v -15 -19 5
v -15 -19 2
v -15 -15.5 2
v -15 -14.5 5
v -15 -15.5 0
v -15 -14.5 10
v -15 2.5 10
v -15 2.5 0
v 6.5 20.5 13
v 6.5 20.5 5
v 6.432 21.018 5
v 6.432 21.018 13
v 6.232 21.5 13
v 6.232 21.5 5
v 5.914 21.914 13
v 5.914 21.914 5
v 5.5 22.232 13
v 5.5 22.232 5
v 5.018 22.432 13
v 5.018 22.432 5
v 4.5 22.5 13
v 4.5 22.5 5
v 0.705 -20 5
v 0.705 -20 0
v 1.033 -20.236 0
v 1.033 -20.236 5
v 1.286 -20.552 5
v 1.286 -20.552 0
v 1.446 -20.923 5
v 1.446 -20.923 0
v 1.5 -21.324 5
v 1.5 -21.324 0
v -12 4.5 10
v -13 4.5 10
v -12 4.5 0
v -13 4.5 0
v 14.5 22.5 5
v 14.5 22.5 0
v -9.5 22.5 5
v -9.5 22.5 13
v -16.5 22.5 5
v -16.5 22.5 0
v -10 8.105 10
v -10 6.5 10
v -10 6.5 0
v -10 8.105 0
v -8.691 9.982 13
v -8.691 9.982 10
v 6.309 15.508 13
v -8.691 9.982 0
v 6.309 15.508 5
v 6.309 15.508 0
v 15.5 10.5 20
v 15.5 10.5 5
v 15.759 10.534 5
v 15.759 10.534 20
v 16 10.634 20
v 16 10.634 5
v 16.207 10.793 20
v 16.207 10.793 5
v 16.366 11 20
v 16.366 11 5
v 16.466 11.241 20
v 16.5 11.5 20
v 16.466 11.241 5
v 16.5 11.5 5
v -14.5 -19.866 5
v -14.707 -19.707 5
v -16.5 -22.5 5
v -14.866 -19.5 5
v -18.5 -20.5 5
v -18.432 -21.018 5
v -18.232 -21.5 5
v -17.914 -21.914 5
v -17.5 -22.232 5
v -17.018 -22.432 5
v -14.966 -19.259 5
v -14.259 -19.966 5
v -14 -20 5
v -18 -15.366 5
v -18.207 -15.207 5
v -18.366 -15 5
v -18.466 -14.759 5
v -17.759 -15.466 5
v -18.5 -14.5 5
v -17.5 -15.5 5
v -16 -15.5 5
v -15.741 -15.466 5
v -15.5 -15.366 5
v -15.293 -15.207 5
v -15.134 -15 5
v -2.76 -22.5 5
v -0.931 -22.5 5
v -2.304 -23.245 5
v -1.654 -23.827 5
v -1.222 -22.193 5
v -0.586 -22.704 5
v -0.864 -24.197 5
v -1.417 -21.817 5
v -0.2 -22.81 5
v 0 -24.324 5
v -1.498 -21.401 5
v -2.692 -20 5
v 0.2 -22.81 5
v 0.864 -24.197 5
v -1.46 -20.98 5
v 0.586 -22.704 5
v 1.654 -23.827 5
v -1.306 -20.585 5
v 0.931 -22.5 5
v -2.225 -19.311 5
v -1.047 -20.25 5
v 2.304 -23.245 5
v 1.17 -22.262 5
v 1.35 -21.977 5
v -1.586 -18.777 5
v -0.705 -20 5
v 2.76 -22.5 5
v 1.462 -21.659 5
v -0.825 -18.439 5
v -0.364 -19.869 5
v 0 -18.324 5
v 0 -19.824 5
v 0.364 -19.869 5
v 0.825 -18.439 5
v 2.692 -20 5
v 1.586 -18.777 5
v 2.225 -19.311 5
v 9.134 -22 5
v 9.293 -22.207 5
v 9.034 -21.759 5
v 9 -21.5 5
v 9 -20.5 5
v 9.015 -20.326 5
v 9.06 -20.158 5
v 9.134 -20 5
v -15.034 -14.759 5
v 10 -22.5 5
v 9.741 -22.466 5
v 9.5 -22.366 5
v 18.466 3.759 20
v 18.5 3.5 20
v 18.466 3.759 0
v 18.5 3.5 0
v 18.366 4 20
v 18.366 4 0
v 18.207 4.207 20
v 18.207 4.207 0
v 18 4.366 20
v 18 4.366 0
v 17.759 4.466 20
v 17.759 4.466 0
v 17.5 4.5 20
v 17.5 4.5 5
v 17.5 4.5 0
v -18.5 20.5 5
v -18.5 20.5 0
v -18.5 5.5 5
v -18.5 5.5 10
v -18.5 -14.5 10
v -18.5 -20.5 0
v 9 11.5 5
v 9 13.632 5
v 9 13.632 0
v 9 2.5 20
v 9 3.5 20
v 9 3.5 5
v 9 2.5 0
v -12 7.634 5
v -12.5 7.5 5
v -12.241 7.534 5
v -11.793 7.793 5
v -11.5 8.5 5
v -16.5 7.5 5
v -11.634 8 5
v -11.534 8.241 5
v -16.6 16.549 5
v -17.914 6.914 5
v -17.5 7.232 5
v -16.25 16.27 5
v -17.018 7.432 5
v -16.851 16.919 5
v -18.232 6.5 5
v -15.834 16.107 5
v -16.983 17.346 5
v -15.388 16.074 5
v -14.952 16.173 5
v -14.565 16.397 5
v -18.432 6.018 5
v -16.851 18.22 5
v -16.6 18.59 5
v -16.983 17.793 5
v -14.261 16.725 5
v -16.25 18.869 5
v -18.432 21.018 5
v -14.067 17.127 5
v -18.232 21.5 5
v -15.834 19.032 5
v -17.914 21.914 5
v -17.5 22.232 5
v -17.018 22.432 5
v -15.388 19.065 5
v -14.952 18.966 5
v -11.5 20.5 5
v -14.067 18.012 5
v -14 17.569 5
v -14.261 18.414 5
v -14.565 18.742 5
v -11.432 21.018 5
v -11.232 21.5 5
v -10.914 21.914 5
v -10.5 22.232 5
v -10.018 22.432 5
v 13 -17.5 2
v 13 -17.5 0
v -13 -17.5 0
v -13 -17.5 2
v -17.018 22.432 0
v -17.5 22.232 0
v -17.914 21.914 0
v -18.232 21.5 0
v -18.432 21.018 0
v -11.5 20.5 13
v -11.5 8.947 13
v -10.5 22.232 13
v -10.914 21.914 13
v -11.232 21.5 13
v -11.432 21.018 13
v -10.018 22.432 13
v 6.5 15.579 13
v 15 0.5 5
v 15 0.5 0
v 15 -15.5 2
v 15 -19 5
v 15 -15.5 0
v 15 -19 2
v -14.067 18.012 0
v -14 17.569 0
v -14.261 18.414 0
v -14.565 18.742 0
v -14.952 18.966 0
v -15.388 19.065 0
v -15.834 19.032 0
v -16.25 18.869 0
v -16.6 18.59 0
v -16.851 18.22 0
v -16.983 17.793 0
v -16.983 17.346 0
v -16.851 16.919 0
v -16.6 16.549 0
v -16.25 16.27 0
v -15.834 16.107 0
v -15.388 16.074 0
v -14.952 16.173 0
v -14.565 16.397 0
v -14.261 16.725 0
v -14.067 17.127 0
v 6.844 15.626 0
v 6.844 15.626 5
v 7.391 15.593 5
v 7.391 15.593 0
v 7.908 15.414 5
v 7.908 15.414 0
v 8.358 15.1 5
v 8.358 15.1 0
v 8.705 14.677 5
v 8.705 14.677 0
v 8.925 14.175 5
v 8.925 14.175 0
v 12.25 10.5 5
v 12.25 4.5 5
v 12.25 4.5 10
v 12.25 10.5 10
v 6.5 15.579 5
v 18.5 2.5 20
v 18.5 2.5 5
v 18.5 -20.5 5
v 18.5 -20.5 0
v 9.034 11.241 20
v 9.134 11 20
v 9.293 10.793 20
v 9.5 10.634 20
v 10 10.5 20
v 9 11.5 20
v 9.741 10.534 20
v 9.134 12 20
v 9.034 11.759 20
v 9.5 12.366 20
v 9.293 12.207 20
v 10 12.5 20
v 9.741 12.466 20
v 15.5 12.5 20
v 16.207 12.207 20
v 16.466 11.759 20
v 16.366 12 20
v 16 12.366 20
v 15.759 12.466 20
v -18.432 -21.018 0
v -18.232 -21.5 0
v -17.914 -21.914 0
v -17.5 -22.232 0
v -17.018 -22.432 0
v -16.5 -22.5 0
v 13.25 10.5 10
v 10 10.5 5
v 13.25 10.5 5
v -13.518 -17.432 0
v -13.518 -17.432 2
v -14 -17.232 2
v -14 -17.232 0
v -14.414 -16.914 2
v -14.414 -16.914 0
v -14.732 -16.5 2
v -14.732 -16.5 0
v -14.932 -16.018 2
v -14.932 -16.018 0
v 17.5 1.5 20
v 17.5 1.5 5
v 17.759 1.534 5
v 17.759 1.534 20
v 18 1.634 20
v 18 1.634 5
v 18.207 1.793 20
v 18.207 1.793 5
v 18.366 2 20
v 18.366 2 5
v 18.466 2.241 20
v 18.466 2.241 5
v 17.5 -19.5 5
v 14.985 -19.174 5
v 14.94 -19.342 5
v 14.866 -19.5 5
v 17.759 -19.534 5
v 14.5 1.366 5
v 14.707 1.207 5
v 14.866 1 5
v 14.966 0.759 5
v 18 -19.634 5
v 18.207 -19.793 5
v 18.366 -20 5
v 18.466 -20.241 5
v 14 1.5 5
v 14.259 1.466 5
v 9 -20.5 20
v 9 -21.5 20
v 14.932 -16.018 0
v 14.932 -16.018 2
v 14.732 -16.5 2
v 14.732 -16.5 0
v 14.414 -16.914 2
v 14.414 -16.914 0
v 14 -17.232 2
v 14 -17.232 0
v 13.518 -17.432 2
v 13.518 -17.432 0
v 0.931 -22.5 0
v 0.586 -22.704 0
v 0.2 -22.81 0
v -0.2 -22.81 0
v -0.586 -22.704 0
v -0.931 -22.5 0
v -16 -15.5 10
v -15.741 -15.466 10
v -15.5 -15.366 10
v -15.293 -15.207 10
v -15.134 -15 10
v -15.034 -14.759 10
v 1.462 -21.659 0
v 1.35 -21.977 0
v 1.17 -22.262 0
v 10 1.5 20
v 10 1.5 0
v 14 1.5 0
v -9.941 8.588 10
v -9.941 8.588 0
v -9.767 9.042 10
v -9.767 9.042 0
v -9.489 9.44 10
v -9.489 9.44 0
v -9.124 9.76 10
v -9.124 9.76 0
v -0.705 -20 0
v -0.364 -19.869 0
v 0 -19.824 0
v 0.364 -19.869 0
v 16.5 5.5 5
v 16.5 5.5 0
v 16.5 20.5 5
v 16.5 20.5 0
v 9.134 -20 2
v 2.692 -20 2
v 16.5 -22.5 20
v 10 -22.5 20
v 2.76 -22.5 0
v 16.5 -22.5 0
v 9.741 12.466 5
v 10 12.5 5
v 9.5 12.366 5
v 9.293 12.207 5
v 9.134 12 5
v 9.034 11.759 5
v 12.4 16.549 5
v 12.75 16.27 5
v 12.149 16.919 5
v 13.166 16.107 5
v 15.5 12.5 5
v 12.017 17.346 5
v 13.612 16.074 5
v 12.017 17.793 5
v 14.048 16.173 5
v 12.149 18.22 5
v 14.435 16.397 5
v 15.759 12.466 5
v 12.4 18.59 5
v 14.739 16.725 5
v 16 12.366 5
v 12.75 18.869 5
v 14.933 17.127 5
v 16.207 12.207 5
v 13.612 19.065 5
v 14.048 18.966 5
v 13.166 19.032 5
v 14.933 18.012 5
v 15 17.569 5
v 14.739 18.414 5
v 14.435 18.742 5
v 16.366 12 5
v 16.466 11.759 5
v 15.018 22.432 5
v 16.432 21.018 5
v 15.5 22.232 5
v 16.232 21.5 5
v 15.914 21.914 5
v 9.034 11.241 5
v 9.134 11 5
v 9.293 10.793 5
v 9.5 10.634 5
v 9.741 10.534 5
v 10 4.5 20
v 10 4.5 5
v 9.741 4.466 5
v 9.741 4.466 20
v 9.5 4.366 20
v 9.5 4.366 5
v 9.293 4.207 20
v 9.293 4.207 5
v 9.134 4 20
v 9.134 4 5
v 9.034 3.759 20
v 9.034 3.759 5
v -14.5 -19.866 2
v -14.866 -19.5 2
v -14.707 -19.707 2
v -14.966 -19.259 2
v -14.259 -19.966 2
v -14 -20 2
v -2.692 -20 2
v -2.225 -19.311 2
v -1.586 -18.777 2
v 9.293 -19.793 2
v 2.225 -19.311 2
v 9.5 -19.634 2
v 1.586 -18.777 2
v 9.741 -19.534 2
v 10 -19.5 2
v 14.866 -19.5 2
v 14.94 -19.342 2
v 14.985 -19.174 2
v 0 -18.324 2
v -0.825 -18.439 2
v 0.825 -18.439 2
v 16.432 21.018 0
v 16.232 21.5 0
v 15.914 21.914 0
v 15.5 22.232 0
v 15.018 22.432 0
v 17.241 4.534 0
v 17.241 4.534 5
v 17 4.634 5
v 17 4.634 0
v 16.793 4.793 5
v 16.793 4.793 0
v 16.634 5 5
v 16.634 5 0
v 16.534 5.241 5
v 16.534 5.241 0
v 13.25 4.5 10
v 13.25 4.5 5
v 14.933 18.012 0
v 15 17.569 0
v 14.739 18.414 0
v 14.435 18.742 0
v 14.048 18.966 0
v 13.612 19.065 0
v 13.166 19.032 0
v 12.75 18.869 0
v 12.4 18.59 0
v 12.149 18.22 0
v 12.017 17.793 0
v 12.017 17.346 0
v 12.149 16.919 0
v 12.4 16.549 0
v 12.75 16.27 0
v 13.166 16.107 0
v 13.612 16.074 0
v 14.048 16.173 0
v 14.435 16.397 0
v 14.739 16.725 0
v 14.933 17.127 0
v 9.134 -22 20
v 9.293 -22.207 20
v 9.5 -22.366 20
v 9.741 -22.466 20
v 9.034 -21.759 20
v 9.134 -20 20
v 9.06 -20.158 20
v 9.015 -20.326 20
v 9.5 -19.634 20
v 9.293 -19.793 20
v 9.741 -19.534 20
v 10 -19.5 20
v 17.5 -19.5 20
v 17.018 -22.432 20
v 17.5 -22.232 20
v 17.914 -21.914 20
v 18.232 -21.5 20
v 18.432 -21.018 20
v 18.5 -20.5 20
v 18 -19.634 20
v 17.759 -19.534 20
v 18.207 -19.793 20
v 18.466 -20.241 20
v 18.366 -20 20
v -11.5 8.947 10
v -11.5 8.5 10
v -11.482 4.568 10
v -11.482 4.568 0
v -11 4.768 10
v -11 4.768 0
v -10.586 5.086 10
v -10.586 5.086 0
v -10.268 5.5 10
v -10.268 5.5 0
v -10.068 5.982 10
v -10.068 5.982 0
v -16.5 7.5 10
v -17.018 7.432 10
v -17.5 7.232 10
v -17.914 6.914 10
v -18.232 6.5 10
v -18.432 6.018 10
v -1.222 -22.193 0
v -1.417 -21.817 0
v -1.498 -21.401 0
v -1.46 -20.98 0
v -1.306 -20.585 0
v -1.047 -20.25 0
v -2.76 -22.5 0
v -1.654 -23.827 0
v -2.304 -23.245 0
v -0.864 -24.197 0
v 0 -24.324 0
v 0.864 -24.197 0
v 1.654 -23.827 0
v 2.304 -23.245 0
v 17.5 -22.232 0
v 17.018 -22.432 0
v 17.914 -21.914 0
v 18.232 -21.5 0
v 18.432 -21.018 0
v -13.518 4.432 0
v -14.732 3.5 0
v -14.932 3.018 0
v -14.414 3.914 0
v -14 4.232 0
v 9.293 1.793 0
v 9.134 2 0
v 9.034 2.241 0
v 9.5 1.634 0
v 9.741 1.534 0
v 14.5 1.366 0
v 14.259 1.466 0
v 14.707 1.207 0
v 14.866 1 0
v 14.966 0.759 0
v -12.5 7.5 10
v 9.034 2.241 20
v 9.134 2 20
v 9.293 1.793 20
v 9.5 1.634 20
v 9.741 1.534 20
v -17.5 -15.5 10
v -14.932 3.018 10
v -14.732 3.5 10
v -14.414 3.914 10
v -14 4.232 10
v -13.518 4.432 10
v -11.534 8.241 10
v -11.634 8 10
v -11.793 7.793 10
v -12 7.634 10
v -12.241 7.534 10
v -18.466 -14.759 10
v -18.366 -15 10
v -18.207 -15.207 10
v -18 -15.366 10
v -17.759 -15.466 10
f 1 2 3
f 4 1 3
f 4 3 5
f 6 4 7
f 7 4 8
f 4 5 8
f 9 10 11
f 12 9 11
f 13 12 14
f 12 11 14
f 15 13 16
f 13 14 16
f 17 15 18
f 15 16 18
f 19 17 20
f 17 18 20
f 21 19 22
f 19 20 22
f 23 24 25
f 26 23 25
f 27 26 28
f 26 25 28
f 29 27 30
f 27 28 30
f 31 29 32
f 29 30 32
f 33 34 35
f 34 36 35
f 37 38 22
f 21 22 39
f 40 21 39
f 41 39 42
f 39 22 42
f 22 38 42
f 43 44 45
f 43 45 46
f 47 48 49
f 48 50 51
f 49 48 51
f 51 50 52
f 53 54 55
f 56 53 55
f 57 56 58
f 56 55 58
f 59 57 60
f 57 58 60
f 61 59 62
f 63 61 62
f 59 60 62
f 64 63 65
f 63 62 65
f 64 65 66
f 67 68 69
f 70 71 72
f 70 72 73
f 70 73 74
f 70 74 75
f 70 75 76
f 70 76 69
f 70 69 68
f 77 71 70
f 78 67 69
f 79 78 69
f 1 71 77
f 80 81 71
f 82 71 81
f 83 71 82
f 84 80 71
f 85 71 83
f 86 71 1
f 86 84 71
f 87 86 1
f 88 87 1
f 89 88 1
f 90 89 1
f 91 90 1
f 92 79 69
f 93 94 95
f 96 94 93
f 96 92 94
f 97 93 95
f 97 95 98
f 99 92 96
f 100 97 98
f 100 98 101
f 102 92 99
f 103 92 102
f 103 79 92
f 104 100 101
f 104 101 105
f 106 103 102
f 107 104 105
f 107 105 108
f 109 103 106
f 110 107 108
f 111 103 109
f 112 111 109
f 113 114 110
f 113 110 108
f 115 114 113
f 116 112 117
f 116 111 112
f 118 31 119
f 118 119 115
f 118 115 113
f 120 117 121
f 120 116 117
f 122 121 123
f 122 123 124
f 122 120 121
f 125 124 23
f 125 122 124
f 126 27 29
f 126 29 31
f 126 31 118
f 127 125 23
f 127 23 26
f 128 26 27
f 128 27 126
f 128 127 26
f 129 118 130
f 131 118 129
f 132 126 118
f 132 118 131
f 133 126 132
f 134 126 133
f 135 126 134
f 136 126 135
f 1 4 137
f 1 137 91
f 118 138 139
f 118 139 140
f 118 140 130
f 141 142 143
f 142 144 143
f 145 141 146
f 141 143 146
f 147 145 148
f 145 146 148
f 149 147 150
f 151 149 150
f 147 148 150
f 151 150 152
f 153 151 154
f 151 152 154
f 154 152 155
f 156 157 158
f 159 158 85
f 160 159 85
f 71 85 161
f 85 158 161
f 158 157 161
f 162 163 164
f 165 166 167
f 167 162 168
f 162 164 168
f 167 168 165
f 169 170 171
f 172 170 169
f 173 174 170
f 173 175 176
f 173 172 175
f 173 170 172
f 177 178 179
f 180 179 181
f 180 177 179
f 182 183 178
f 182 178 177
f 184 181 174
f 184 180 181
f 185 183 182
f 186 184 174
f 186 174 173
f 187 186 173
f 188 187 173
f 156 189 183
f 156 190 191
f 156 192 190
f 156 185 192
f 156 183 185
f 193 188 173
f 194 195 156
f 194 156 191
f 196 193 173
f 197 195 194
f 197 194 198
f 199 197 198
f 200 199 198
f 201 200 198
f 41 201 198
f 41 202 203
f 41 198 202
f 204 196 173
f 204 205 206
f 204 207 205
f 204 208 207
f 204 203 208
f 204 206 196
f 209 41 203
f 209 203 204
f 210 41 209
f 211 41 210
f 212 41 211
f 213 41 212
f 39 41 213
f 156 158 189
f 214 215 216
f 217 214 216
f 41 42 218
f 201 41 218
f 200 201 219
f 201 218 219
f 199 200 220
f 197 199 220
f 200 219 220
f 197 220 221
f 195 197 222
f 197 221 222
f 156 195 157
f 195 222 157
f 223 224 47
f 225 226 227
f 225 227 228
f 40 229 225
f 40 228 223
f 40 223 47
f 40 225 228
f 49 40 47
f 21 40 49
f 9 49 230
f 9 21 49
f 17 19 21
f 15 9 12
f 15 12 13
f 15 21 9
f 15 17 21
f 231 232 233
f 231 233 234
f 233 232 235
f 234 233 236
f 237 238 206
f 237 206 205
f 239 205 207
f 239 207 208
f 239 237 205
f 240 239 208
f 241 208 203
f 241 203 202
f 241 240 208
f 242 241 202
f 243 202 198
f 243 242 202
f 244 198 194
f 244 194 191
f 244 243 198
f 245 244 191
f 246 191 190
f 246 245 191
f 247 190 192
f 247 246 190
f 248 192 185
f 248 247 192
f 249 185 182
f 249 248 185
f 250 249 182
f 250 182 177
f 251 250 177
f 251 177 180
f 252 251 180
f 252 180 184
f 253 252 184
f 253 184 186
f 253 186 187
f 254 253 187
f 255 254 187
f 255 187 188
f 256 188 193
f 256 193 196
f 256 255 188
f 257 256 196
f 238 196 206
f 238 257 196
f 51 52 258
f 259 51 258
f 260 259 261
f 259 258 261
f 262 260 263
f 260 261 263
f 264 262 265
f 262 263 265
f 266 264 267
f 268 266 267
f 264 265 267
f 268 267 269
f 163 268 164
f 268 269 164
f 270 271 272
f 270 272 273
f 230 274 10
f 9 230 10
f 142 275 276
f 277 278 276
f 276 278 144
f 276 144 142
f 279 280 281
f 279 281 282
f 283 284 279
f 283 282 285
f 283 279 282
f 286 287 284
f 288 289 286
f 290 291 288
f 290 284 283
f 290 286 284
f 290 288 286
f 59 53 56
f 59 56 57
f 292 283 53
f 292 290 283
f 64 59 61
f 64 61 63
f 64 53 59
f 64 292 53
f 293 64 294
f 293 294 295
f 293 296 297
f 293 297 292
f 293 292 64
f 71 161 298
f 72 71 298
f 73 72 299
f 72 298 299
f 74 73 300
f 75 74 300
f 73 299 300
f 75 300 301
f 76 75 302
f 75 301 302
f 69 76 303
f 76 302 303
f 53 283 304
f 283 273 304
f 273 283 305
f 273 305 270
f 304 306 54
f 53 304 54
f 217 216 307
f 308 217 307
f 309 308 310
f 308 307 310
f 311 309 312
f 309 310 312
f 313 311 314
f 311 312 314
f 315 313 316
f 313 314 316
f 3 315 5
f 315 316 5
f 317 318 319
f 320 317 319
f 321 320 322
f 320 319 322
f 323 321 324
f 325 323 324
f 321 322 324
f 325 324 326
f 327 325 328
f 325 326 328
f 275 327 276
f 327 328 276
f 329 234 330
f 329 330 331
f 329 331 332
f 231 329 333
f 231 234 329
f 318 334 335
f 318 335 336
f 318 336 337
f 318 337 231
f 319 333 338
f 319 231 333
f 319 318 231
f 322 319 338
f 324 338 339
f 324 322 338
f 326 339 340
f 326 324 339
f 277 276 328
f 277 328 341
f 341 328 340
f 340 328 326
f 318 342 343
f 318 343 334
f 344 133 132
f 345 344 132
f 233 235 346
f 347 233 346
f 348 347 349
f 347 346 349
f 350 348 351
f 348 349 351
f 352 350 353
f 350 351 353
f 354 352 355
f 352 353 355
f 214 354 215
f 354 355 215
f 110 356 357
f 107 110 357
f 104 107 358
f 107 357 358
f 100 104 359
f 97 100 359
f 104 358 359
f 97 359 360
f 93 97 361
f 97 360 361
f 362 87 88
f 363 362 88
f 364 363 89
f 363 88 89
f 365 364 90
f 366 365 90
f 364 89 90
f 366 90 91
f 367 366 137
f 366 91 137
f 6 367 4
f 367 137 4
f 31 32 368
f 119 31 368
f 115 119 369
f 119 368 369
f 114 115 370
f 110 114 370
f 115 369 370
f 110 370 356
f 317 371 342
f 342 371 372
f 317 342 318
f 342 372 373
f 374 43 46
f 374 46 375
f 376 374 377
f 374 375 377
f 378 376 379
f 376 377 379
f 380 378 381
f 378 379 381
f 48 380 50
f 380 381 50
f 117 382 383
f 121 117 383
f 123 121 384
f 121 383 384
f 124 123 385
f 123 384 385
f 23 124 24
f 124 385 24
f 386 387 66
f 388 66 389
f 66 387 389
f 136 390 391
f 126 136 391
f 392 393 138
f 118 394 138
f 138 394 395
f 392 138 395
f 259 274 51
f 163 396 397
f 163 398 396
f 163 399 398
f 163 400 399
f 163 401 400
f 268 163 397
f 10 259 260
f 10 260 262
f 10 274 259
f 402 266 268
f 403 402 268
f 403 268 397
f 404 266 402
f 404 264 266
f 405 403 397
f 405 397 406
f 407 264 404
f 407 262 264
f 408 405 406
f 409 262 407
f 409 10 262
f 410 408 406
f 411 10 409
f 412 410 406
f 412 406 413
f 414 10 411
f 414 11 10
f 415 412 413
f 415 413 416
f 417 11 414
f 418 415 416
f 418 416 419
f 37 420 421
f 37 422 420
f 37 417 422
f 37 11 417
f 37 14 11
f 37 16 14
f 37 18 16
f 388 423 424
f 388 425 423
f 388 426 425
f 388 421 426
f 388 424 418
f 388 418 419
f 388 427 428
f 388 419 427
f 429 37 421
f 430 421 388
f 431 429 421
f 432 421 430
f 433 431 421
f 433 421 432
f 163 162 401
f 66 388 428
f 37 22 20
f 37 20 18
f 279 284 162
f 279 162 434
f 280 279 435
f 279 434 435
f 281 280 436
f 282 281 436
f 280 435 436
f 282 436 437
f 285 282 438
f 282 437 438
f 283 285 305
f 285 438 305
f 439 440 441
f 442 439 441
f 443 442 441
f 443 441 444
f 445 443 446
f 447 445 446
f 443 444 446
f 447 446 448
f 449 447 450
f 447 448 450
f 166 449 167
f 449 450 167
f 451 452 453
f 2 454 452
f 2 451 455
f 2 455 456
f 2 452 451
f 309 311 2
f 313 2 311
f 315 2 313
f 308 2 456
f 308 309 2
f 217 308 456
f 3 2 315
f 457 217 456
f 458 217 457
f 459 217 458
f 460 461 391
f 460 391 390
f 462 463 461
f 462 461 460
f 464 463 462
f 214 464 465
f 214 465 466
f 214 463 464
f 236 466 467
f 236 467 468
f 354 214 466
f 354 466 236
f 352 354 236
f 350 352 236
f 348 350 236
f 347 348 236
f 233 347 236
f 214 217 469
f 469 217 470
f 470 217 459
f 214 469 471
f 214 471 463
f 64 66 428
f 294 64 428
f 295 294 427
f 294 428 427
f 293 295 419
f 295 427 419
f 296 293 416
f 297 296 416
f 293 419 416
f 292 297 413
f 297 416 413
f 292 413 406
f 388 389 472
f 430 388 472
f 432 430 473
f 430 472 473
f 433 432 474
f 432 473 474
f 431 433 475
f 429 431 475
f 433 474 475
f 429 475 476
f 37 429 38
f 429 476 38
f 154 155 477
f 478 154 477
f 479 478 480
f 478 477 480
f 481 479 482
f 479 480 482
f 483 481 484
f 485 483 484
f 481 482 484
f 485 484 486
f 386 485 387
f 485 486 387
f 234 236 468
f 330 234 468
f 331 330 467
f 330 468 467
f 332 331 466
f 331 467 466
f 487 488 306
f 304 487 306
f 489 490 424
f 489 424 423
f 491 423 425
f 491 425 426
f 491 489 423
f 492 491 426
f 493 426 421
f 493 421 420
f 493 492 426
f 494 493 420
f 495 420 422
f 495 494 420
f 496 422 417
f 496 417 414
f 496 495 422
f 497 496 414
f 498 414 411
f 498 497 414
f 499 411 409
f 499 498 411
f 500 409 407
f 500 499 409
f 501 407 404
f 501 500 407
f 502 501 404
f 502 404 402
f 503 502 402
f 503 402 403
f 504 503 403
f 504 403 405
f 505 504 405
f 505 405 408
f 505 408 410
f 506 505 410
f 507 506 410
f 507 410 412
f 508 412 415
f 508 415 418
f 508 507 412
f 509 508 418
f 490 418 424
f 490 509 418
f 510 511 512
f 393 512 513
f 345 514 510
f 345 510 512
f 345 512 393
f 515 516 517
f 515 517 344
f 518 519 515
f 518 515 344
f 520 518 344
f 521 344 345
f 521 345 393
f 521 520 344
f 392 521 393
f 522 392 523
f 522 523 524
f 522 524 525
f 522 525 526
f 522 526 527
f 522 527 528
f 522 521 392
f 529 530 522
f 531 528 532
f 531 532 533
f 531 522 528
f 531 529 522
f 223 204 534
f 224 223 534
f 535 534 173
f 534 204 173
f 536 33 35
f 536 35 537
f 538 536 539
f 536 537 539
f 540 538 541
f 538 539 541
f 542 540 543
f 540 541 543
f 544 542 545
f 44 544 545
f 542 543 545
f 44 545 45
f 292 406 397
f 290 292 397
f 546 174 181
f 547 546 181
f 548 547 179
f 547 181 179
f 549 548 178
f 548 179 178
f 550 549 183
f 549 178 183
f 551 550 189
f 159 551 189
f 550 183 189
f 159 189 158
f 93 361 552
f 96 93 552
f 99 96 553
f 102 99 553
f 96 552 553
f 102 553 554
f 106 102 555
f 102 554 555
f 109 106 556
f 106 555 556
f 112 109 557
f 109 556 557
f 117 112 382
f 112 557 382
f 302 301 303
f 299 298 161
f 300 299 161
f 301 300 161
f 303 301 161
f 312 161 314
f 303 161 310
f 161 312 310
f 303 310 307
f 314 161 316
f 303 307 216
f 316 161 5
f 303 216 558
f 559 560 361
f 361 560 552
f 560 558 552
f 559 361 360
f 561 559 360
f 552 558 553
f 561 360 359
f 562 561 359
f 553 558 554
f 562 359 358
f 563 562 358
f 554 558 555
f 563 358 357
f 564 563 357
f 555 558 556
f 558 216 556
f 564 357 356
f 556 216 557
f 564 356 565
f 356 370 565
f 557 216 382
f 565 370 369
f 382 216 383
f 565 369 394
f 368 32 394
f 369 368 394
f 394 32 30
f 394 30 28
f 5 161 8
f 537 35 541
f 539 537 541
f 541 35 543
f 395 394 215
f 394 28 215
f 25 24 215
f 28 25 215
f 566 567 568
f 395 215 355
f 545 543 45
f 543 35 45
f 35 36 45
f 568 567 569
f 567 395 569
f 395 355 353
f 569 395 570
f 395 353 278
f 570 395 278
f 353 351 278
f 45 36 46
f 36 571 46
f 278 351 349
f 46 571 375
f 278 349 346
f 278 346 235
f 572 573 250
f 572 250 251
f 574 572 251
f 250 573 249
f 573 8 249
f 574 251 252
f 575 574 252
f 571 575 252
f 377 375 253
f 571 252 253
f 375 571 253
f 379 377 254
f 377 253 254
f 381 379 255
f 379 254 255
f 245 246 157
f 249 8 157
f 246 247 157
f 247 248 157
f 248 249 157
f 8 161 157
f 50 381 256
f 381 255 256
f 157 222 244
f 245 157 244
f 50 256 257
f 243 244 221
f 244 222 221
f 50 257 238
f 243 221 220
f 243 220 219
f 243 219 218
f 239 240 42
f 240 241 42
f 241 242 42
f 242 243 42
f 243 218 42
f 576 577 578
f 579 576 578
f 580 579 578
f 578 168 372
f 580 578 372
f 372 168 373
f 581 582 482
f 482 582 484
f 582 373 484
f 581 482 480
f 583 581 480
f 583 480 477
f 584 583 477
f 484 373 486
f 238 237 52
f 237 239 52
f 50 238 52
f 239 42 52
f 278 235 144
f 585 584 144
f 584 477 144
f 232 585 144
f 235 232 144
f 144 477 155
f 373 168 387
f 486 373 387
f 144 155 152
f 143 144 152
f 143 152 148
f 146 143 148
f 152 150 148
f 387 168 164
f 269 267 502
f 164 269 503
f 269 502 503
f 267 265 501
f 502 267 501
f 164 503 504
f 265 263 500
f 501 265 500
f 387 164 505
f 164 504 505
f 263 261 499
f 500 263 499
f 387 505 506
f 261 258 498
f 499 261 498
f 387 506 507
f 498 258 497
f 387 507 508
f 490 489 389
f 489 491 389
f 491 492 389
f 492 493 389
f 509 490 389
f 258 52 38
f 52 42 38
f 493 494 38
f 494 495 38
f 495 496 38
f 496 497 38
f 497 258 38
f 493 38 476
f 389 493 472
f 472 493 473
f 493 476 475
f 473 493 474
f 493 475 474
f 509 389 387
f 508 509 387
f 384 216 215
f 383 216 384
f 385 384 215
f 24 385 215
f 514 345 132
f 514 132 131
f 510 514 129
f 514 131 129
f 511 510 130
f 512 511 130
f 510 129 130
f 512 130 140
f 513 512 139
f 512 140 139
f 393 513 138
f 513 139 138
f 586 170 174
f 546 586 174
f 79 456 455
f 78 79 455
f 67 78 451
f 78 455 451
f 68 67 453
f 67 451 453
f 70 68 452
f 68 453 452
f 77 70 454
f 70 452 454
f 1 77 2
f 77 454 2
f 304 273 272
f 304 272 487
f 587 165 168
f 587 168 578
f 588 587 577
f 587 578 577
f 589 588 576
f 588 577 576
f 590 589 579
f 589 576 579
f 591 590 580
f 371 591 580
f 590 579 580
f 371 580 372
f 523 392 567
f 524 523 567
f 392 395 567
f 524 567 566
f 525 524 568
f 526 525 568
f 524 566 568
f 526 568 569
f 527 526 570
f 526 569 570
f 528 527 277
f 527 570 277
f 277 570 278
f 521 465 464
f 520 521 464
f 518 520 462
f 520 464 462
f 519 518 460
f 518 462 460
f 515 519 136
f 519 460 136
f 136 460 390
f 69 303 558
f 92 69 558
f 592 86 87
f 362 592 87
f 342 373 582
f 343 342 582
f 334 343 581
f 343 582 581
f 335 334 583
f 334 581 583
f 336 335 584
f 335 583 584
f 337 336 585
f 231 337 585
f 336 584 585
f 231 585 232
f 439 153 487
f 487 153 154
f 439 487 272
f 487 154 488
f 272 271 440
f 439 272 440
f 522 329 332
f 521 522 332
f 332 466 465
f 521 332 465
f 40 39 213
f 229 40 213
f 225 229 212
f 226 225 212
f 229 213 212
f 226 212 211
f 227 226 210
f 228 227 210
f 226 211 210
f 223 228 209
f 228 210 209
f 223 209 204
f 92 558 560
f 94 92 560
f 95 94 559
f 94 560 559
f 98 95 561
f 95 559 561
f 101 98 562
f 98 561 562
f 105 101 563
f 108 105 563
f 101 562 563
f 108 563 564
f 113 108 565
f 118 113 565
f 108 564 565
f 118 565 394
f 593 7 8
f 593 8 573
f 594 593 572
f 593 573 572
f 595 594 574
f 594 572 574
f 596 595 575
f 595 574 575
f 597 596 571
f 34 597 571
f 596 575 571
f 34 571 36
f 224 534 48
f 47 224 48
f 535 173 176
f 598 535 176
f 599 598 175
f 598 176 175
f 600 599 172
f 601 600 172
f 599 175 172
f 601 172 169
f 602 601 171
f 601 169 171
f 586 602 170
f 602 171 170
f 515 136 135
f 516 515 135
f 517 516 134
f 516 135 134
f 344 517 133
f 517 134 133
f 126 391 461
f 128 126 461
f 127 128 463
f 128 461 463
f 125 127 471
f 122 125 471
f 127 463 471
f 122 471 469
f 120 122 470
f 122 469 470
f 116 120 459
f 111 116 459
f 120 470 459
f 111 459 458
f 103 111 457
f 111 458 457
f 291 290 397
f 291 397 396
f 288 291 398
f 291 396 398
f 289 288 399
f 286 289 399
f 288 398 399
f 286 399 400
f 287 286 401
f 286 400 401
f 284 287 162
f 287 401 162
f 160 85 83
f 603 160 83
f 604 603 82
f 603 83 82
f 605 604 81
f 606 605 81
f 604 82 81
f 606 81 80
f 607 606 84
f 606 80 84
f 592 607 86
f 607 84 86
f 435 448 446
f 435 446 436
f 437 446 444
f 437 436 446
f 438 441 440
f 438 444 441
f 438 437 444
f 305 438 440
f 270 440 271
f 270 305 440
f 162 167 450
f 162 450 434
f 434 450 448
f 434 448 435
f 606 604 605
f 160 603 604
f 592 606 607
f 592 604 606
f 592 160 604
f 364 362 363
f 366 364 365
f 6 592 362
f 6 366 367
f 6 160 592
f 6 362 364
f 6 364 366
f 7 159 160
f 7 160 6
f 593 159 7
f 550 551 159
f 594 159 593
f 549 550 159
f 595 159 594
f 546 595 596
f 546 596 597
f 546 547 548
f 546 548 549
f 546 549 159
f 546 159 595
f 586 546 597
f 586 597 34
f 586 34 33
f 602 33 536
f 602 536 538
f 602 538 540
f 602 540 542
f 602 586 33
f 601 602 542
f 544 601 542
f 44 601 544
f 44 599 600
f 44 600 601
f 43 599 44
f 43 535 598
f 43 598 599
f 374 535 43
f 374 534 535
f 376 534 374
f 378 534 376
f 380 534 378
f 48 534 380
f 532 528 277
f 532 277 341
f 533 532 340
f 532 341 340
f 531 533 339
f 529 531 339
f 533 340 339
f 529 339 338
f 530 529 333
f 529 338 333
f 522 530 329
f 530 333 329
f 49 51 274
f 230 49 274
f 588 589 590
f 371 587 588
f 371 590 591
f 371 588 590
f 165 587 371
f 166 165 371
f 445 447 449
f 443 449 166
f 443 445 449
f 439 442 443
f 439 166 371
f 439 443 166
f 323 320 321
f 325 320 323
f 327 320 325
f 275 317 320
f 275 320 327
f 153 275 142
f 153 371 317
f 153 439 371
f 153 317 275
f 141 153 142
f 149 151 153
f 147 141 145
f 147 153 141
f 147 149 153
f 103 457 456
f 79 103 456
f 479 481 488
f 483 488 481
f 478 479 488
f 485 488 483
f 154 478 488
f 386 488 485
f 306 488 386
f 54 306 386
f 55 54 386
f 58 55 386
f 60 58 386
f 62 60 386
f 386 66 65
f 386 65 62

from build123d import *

# Parameters (mm, degrees)
F1_DEPTH = 2
F0_R     = 3
F0_R_2   = 1.5
F2_DEPTH = 5
F4_DEPTH = 5
F5_DEPTH = 8
F6_DEPTH = 4
F7_DEPTH = 15
F8_DEPTH = 15
F3_W     = 1
F3_H     = 6
F9_DEPTH = 5


with BuildPart() as f1:
    # F0 (on Top) → F1 (new body)
    with BuildSketch(Plane.XY):
        with BuildLine():
            Line((-14, -20), (-2.69212803, -20))
            ThreePointArc((-2.69212803, -20), (0, -18.323800087), (2.69212803, -20))
            Line((2.69212803, -20), (14, -20))
            ThreePointArc((14, -20), (14.7071067812, -19.7071067812), (15, -19))
            Line((15, -19), (15, -15.5))
            ThreePointArc((15, -15.5), (14.4142135624, -16.9142135624), (13, -17.5))
            Line((13, -17.5), (-13, -17.5))
            ThreePointArc((-13, -17.5), (-14.4142135624, -16.9142135624), (-15, -15.5))
            Line((-15, -15.5), (-15, -19))
            ThreePointArc((-15, -19), (-14.7071067812, -19.7071067812), (-14, -20))
        make_face()
    extrude(amount=F1_DEPTH)

    # F0 (on Top) → F2 (join)
    with BuildSketch(Plane.XY):
        with BuildLine():
            Line((2.7598104581, -22.5), (16.5, -22.5))
            ThreePointArc((16.5, -22.5), (17.9142135624, -21.9142135624), (18.5, -20.5))
            Line((18.5, -20.5), (18.5, 3.5))
            ThreePointArc((18.5, 3.5), (18.2071067812, 4.2071067812), (17.5, 4.5))
            ThreePointArc((17.5, 4.5), (16.7928932188, 4.7928932188), (16.5, 5.5))
            Line((16.5, 5.5), (16.5, 17.5694916397))
            Line((16.5, 17.5694916397), (16.5, 20.5))
            ThreePointArc((16.5, 20.5), (15.9142135624, 21.9142135624), (14.5, 22.5))
            Line((14.5, 22.5), (-16.5, 22.5))
            ThreePointArc((-16.5, 22.5), (-17.9142135624, 21.9142135624), (-18.5, 20.5))
            Line((-18.5, 20.5), (-18.5, 17.5694916397))
            Line((-18.5, 17.5694916397), (-18.5, -20.5))
            ThreePointArc((-18.5, -20.5), (-17.9142135624, -21.9142135624), (-16.5, -22.5))
            Line((-16.5, -22.5), (-2.7598104581, -22.5))
            ThreePointArc((-2.7598104581, -22.5), (-2.9989011853, -21.2426109214), (-2.69212803, -20))
            Line((-2.69212803, -20), (-14, -20))
            ThreePointArc((-14, -20), (-14.7071067812, -19.7071067812), (-15, -19))
            Line((-15, -19), (-15, -15.5))
            Line((-15, -15.5), (-15, 2.5))
            ThreePointArc((-15, 2.5), (-14.4142135624, 3.9142135624), (-13, 4.5))
            Line((-13, 4.5), (-12, 4.5))
            ThreePointArc((-12, 4.5), (-10.5857864376, 5.0857864376), (-10, 6.5))
            Line((-10, 6.5), (-10, 8.1054256072))
            ThreePointArc((-10, 8.1054256072), (-9.6405519552, 9.2493614806), (-8.6914107177, 9.9821118409))
            Line((-8.6914107177, 9.9821118409), (6.3085892823, 15.5084276303))
            ThreePointArc((6.3085892823, 15.5084276303), (8.1439358734, 15.2722933519), (9, 13.6317413967))
            Line((9, 13.6317413967), (9, 2.5))
            ThreePointArc((9, 2.5), (9.2928932188, 1.7928932188), (10, 1.5))
            Line((10, 1.5), (14, 1.5))
            ThreePointArc((14, 1.5), (14.7071067812, 1.2071067812), (15, 0.5))
            Line((15, 0.5), (15, -15.5))
            Line((15, -15.5), (15, -19))
            ThreePointArc((15, -19), (14.7071067812, -19.7071067812), (14, -20))
            Line((14, -20), (2.69212803, -20))
            ThreePointArc((2.69212803, -20), (2.9220184881, -20.6442355536), (3, -21.323800087))
            ThreePointArc((3, -21.323800087), (2.9393393283, -21.9240369676), (2.7598104581, -22.5))
        make_face()
        with BuildLine():
            ThreePointArc((-12.5, 17.5694916397), (-15.5, 14.5694916397), (-18.5, 17.5694916397))
            ThreePointArc((-18.5, 17.5694916397), (-15.5, 20.5694916397), (-12.5, 17.5694916397))
        make_face(mode=Mode.SUBTRACT)
        with Locations((13.5, 17.5694916397)):
            Circle(F0_R, mode=Mode.SUBTRACT)
        with BuildLine():
            ThreePointArc((2.69212803, -20), (0, -18.323800087), (-2.69212803, -20))
            Line((-2.69212803, -20), (-0.7053746024, -20))
            ThreePointArc((-0.7053746024, -20), (0, -19.823800087), (0.7053746024, -20))
            Line((0.7053746024, -20), (2.69212803, -20))
        make_face()
        with BuildLine():
            ThreePointArc((-2.69212803, -20), (-2.9989011853, -21.2426109214), (-2.7598104581, -22.5))
            Line((-2.7598104581, -22.5), (-0.9308886961, -22.5))
            ThreePointArc((-0.9308886961, -22.5), (-1.4939342005, -21.1890388), (-0.7053746024, -20))
            Line((-0.7053746024, -20), (-2.69212803, -20))
        make_face()
        with BuildLine():
            Line((0.9308886961, -22.5), (2.7598104581, -22.5))
            ThreePointArc((2.7598104581, -22.5), (2.9393393283, -21.9240369676), (3, -21.323800087))
            ThreePointArc((3, -21.323800087), (2.9220184881, -20.6442355536), (2.69212803, -20))
            Line((2.69212803, -20), (0.7053746024, -20))
            ThreePointArc((0.7053746024, -20), (1.2860913466, -20.5518097708), (1.5, -21.323800087))
            ThreePointArc((1.5, -21.323800087), (1.3502468375, -21.9771250275), (0.9308886961, -22.5))
        make_face()
        with BuildLine():
            ThreePointArc((-2.7598104581, -22.5), (0, -24.323800087), (2.7598104581, -22.5))
            Line((2.7598104581, -22.5), (0.9308886961, -22.5))
            ThreePointArc((0.9308886961, -22.5), (0, -22.823800087), (-0.9308886961, -22.5))
            Line((-0.9308886961, -22.5), (-2.7598104581, -22.5))
        make_face()
        with BuildLine():
            ThreePointArc((-12.5, 17.5694916397), (-15.5, 20.5694916397), (-18.5, 17.5694916397))
            ThreePointArc((-18.5, 17.5694916397), (-15.5, 14.5694916397), (-12.5, 17.5694916397))
        make_face()
        with Locations((-15.5, 17.5694916397)):
            Circle(F0_R_2, mode=Mode.SUBTRACT)
        with Locations((13.5, 17.5694916397)):
            Circle(F0_R)
        with Locations((13.5, 17.5694916397)):
            Circle(F0_R_2, mode=Mode.SUBTRACT)
    extrude(amount=F2_DEPTH)

    # F3 (on face) → F4 (join)
    with BuildSketch(Plane.XY.offset(5)):
        with BuildLine():
            ThreePointArc((-18.5, -14.5), (-18.2071067812, -15.2071067812), (-17.5, -15.5))
            Line((-17.5, -15.5), (-16, -15.5))
            ThreePointArc((-16, -15.5), (-15.2928932188, -15.2071067812), (-15, -14.5))
            Line((-15, -14.5), (-15, 2.5))
            ThreePointArc((-15, 2.5), (-14.4142135624, 3.9142135624), (-13, 4.5))
            Line((-13, 4.5), (-12, 4.5))
            ThreePointArc((-12, 4.5), (-10.5857864376, 5.0857864376), (-10, 6.5))
            Line((-10, 6.5), (-10, 8.1054256072))
            ThreePointArc((-10, 8.1054256072), (-9.6405519552, 9.2493614806), (-8.6914107177, 9.9821118409))
            Line((-8.6914107177, 9.9821118409), (-11.5, 8.9473684211))
            Line((-11.5, 8.9473684211), (-11.5, 8.5))
            ThreePointArc((-11.5, 8.5), (-11.7928932188, 7.7928932188), (-12.5, 7.5))
            Line((-12.5, 7.5), (-16.5, 7.5))
            ThreePointArc((-16.5, 7.5), (-17.9142135624, 6.9142135624), (-18.5, 5.5))
            Line((-18.5, 5.5), (-18.5, -14.5))
        make_face()
    extrude(amount=F4_DEPTH)

    # F3 (on face) → F5 (join)
    with BuildSketch(Plane.XY.offset(5)):
        with BuildLine():
            Line((4.5, 22.5), (-9.5, 22.5))
            ThreePointArc((-9.5, 22.5), (-10.9142135624, 21.9142135624), (-11.5, 20.5))
            Line((-11.5, 20.5), (-11.5, 8.9473684211))
            Line((-11.5, 8.9473684211), (-8.6914107177, 9.9821118409))
            Line((-8.6914107177, 9.9821118409), (6.3085892823, 15.5084276303))
            Line((6.3085892823, 15.5084276303), (6.5, 15.5789473684))
            Line((6.5, 15.5789473684), (6.5, 20.5))
            ThreePointArc((6.5, 20.5), (5.9142135624, 21.9142135624), (4.5, 22.5))
        make_face()
    extrude(amount=F5_DEPTH)

    # F3 (on face) → F6 (join)
    with BuildSketch(Plane.XY.offset(5)):
        with BuildLine():
            ThreePointArc((10, -19.5), (9.5, -19.6339745962), (9.1339745962, -20))
            Line((9.1339745962, -20), (14, -20))
            ThreePointArc((14, -20), (14.5, -19.8660254038), (14.8660254038, -19.5))
            Line((14.8660254038, -19.5), (10, -19.5))
        make_face()
        with BuildLine():
            ThreePointArc((9, -21.5), (9.2928932188, -22.2071067812), (10, -22.5))
            Line((10, -22.5), (16.5, -22.5))
            ThreePointArc((16.5, -22.5), (17.9142135624, -21.9142135624), (18.5, -20.5))
            ThreePointArc((18.5, -20.5), (18.2071067812, -19.7928932188), (17.5, -19.5))
            Line((17.5, -19.5), (14.8660254038, -19.5))
            ThreePointArc((14.8660254038, -19.5), (14.5, -19.8660254038), (14, -20))
            Line((14, -20), (9.1339745962, -20))
            ThreePointArc((9.1339745962, -20), (9.0340741737, -20.2411809549), (9, -20.5))
            Line((9, -20.5), (9, -21.5))
        make_face()
    extrude(amount=-F6_DEPTH)

    # F3 (on face) → F7 (join)
    with BuildSketch(Plane.XY.offset(5)):
        with BuildLine():
            ThreePointArc((10, -19.5), (9.5, -19.6339745962), (9.1339745962, -20))
            Line((9.1339745962, -20), (14, -20))
            ThreePointArc((14, -20), (14.5, -19.8660254038), (14.8660254038, -19.5))
            Line((14.8660254038, -19.5), (10, -19.5))
        make_face()
        with BuildLine():
            ThreePointArc((9, -21.5), (9.2928932188, -22.2071067812), (10, -22.5))
            Line((10, -22.5), (16.5, -22.5))
            ThreePointArc((16.5, -22.5), (17.9142135624, -21.9142135624), (18.5, -20.5))
            ThreePointArc((18.5, -20.5), (18.2071067812, -19.7928932188), (17.5, -19.5))
            Line((17.5, -19.5), (14.8660254038, -19.5))
            ThreePointArc((14.8660254038, -19.5), (14.5, -19.8660254038), (14, -20))
            Line((14, -20), (9.1339745962, -20))
            ThreePointArc((9.1339745962, -20), (9.0340741737, -20.2411809549), (9, -20.5))
            Line((9, -20.5), (9, -21.5))
        make_face()
    extrude(amount=F7_DEPTH)

    # F3 (on face) → F8 (join)
    with BuildSketch(Plane.XY.offset(5)):
        with BuildLine():
            ThreePointArc((17.5, 1.5), (18.2071067812, 1.7928932188), (18.5, 2.5))
            Line((18.5, 2.5), (18.5, 3.5))
            ThreePointArc((18.5, 3.5), (18.2071067812, 4.2071067812), (17.5, 4.5))
            Line((17.5, 4.5), (13.25, 4.5))
            Line((13.25, 4.5), (12.25, 4.5))
            Line((12.25, 4.5), (10, 4.5))
            ThreePointArc((10, 4.5), (9.2928932188, 4.2071067812), (9, 3.5))
            Line((9, 3.5), (9, 2.5))
            ThreePointArc((9, 2.5), (9.2928932188, 1.7928932188), (10, 1.5))
            Line((10, 1.5), (12.25, 1.5))
            Line((12.25, 1.5), (13.25, 1.5))
            Line((13.25, 1.5), (14, 1.5))
            Line((14, 1.5), (17.5, 1.5))
        make_face()
        with BuildLine():
            ThreePointArc((15.5, 10.5), (16.2071067812, 10.7928932188), (16.5, 11.5))
            ThreePointArc((16.5, 11.5), (16.2071067812, 12.2071067812), (15.5, 12.5))
            Line((15.5, 12.5), (10, 12.5))
            ThreePointArc((10, 12.5), (9.2928932188, 12.2071067812), (9, 11.5))
            ThreePointArc((9, 11.5), (9.2928932188, 10.7928932188), (10, 10.5))
            Line((10, 10.5), (12.25, 10.5))
            Line((12.25, 10.5), (13.25, 10.5))
            Line((13.25, 10.5), (15.5, 10.5))
        make_face()
    extrude(amount=F8_DEPTH)

    # F3 (on face) → F9 (join)
    with BuildSketch(Plane.XY.offset(5)):
        with Locations((12.75, 7.5)):
            Rectangle(F3_W, F3_H)
    extrude(amount=F9_DEPTH)


solid = f1.part
